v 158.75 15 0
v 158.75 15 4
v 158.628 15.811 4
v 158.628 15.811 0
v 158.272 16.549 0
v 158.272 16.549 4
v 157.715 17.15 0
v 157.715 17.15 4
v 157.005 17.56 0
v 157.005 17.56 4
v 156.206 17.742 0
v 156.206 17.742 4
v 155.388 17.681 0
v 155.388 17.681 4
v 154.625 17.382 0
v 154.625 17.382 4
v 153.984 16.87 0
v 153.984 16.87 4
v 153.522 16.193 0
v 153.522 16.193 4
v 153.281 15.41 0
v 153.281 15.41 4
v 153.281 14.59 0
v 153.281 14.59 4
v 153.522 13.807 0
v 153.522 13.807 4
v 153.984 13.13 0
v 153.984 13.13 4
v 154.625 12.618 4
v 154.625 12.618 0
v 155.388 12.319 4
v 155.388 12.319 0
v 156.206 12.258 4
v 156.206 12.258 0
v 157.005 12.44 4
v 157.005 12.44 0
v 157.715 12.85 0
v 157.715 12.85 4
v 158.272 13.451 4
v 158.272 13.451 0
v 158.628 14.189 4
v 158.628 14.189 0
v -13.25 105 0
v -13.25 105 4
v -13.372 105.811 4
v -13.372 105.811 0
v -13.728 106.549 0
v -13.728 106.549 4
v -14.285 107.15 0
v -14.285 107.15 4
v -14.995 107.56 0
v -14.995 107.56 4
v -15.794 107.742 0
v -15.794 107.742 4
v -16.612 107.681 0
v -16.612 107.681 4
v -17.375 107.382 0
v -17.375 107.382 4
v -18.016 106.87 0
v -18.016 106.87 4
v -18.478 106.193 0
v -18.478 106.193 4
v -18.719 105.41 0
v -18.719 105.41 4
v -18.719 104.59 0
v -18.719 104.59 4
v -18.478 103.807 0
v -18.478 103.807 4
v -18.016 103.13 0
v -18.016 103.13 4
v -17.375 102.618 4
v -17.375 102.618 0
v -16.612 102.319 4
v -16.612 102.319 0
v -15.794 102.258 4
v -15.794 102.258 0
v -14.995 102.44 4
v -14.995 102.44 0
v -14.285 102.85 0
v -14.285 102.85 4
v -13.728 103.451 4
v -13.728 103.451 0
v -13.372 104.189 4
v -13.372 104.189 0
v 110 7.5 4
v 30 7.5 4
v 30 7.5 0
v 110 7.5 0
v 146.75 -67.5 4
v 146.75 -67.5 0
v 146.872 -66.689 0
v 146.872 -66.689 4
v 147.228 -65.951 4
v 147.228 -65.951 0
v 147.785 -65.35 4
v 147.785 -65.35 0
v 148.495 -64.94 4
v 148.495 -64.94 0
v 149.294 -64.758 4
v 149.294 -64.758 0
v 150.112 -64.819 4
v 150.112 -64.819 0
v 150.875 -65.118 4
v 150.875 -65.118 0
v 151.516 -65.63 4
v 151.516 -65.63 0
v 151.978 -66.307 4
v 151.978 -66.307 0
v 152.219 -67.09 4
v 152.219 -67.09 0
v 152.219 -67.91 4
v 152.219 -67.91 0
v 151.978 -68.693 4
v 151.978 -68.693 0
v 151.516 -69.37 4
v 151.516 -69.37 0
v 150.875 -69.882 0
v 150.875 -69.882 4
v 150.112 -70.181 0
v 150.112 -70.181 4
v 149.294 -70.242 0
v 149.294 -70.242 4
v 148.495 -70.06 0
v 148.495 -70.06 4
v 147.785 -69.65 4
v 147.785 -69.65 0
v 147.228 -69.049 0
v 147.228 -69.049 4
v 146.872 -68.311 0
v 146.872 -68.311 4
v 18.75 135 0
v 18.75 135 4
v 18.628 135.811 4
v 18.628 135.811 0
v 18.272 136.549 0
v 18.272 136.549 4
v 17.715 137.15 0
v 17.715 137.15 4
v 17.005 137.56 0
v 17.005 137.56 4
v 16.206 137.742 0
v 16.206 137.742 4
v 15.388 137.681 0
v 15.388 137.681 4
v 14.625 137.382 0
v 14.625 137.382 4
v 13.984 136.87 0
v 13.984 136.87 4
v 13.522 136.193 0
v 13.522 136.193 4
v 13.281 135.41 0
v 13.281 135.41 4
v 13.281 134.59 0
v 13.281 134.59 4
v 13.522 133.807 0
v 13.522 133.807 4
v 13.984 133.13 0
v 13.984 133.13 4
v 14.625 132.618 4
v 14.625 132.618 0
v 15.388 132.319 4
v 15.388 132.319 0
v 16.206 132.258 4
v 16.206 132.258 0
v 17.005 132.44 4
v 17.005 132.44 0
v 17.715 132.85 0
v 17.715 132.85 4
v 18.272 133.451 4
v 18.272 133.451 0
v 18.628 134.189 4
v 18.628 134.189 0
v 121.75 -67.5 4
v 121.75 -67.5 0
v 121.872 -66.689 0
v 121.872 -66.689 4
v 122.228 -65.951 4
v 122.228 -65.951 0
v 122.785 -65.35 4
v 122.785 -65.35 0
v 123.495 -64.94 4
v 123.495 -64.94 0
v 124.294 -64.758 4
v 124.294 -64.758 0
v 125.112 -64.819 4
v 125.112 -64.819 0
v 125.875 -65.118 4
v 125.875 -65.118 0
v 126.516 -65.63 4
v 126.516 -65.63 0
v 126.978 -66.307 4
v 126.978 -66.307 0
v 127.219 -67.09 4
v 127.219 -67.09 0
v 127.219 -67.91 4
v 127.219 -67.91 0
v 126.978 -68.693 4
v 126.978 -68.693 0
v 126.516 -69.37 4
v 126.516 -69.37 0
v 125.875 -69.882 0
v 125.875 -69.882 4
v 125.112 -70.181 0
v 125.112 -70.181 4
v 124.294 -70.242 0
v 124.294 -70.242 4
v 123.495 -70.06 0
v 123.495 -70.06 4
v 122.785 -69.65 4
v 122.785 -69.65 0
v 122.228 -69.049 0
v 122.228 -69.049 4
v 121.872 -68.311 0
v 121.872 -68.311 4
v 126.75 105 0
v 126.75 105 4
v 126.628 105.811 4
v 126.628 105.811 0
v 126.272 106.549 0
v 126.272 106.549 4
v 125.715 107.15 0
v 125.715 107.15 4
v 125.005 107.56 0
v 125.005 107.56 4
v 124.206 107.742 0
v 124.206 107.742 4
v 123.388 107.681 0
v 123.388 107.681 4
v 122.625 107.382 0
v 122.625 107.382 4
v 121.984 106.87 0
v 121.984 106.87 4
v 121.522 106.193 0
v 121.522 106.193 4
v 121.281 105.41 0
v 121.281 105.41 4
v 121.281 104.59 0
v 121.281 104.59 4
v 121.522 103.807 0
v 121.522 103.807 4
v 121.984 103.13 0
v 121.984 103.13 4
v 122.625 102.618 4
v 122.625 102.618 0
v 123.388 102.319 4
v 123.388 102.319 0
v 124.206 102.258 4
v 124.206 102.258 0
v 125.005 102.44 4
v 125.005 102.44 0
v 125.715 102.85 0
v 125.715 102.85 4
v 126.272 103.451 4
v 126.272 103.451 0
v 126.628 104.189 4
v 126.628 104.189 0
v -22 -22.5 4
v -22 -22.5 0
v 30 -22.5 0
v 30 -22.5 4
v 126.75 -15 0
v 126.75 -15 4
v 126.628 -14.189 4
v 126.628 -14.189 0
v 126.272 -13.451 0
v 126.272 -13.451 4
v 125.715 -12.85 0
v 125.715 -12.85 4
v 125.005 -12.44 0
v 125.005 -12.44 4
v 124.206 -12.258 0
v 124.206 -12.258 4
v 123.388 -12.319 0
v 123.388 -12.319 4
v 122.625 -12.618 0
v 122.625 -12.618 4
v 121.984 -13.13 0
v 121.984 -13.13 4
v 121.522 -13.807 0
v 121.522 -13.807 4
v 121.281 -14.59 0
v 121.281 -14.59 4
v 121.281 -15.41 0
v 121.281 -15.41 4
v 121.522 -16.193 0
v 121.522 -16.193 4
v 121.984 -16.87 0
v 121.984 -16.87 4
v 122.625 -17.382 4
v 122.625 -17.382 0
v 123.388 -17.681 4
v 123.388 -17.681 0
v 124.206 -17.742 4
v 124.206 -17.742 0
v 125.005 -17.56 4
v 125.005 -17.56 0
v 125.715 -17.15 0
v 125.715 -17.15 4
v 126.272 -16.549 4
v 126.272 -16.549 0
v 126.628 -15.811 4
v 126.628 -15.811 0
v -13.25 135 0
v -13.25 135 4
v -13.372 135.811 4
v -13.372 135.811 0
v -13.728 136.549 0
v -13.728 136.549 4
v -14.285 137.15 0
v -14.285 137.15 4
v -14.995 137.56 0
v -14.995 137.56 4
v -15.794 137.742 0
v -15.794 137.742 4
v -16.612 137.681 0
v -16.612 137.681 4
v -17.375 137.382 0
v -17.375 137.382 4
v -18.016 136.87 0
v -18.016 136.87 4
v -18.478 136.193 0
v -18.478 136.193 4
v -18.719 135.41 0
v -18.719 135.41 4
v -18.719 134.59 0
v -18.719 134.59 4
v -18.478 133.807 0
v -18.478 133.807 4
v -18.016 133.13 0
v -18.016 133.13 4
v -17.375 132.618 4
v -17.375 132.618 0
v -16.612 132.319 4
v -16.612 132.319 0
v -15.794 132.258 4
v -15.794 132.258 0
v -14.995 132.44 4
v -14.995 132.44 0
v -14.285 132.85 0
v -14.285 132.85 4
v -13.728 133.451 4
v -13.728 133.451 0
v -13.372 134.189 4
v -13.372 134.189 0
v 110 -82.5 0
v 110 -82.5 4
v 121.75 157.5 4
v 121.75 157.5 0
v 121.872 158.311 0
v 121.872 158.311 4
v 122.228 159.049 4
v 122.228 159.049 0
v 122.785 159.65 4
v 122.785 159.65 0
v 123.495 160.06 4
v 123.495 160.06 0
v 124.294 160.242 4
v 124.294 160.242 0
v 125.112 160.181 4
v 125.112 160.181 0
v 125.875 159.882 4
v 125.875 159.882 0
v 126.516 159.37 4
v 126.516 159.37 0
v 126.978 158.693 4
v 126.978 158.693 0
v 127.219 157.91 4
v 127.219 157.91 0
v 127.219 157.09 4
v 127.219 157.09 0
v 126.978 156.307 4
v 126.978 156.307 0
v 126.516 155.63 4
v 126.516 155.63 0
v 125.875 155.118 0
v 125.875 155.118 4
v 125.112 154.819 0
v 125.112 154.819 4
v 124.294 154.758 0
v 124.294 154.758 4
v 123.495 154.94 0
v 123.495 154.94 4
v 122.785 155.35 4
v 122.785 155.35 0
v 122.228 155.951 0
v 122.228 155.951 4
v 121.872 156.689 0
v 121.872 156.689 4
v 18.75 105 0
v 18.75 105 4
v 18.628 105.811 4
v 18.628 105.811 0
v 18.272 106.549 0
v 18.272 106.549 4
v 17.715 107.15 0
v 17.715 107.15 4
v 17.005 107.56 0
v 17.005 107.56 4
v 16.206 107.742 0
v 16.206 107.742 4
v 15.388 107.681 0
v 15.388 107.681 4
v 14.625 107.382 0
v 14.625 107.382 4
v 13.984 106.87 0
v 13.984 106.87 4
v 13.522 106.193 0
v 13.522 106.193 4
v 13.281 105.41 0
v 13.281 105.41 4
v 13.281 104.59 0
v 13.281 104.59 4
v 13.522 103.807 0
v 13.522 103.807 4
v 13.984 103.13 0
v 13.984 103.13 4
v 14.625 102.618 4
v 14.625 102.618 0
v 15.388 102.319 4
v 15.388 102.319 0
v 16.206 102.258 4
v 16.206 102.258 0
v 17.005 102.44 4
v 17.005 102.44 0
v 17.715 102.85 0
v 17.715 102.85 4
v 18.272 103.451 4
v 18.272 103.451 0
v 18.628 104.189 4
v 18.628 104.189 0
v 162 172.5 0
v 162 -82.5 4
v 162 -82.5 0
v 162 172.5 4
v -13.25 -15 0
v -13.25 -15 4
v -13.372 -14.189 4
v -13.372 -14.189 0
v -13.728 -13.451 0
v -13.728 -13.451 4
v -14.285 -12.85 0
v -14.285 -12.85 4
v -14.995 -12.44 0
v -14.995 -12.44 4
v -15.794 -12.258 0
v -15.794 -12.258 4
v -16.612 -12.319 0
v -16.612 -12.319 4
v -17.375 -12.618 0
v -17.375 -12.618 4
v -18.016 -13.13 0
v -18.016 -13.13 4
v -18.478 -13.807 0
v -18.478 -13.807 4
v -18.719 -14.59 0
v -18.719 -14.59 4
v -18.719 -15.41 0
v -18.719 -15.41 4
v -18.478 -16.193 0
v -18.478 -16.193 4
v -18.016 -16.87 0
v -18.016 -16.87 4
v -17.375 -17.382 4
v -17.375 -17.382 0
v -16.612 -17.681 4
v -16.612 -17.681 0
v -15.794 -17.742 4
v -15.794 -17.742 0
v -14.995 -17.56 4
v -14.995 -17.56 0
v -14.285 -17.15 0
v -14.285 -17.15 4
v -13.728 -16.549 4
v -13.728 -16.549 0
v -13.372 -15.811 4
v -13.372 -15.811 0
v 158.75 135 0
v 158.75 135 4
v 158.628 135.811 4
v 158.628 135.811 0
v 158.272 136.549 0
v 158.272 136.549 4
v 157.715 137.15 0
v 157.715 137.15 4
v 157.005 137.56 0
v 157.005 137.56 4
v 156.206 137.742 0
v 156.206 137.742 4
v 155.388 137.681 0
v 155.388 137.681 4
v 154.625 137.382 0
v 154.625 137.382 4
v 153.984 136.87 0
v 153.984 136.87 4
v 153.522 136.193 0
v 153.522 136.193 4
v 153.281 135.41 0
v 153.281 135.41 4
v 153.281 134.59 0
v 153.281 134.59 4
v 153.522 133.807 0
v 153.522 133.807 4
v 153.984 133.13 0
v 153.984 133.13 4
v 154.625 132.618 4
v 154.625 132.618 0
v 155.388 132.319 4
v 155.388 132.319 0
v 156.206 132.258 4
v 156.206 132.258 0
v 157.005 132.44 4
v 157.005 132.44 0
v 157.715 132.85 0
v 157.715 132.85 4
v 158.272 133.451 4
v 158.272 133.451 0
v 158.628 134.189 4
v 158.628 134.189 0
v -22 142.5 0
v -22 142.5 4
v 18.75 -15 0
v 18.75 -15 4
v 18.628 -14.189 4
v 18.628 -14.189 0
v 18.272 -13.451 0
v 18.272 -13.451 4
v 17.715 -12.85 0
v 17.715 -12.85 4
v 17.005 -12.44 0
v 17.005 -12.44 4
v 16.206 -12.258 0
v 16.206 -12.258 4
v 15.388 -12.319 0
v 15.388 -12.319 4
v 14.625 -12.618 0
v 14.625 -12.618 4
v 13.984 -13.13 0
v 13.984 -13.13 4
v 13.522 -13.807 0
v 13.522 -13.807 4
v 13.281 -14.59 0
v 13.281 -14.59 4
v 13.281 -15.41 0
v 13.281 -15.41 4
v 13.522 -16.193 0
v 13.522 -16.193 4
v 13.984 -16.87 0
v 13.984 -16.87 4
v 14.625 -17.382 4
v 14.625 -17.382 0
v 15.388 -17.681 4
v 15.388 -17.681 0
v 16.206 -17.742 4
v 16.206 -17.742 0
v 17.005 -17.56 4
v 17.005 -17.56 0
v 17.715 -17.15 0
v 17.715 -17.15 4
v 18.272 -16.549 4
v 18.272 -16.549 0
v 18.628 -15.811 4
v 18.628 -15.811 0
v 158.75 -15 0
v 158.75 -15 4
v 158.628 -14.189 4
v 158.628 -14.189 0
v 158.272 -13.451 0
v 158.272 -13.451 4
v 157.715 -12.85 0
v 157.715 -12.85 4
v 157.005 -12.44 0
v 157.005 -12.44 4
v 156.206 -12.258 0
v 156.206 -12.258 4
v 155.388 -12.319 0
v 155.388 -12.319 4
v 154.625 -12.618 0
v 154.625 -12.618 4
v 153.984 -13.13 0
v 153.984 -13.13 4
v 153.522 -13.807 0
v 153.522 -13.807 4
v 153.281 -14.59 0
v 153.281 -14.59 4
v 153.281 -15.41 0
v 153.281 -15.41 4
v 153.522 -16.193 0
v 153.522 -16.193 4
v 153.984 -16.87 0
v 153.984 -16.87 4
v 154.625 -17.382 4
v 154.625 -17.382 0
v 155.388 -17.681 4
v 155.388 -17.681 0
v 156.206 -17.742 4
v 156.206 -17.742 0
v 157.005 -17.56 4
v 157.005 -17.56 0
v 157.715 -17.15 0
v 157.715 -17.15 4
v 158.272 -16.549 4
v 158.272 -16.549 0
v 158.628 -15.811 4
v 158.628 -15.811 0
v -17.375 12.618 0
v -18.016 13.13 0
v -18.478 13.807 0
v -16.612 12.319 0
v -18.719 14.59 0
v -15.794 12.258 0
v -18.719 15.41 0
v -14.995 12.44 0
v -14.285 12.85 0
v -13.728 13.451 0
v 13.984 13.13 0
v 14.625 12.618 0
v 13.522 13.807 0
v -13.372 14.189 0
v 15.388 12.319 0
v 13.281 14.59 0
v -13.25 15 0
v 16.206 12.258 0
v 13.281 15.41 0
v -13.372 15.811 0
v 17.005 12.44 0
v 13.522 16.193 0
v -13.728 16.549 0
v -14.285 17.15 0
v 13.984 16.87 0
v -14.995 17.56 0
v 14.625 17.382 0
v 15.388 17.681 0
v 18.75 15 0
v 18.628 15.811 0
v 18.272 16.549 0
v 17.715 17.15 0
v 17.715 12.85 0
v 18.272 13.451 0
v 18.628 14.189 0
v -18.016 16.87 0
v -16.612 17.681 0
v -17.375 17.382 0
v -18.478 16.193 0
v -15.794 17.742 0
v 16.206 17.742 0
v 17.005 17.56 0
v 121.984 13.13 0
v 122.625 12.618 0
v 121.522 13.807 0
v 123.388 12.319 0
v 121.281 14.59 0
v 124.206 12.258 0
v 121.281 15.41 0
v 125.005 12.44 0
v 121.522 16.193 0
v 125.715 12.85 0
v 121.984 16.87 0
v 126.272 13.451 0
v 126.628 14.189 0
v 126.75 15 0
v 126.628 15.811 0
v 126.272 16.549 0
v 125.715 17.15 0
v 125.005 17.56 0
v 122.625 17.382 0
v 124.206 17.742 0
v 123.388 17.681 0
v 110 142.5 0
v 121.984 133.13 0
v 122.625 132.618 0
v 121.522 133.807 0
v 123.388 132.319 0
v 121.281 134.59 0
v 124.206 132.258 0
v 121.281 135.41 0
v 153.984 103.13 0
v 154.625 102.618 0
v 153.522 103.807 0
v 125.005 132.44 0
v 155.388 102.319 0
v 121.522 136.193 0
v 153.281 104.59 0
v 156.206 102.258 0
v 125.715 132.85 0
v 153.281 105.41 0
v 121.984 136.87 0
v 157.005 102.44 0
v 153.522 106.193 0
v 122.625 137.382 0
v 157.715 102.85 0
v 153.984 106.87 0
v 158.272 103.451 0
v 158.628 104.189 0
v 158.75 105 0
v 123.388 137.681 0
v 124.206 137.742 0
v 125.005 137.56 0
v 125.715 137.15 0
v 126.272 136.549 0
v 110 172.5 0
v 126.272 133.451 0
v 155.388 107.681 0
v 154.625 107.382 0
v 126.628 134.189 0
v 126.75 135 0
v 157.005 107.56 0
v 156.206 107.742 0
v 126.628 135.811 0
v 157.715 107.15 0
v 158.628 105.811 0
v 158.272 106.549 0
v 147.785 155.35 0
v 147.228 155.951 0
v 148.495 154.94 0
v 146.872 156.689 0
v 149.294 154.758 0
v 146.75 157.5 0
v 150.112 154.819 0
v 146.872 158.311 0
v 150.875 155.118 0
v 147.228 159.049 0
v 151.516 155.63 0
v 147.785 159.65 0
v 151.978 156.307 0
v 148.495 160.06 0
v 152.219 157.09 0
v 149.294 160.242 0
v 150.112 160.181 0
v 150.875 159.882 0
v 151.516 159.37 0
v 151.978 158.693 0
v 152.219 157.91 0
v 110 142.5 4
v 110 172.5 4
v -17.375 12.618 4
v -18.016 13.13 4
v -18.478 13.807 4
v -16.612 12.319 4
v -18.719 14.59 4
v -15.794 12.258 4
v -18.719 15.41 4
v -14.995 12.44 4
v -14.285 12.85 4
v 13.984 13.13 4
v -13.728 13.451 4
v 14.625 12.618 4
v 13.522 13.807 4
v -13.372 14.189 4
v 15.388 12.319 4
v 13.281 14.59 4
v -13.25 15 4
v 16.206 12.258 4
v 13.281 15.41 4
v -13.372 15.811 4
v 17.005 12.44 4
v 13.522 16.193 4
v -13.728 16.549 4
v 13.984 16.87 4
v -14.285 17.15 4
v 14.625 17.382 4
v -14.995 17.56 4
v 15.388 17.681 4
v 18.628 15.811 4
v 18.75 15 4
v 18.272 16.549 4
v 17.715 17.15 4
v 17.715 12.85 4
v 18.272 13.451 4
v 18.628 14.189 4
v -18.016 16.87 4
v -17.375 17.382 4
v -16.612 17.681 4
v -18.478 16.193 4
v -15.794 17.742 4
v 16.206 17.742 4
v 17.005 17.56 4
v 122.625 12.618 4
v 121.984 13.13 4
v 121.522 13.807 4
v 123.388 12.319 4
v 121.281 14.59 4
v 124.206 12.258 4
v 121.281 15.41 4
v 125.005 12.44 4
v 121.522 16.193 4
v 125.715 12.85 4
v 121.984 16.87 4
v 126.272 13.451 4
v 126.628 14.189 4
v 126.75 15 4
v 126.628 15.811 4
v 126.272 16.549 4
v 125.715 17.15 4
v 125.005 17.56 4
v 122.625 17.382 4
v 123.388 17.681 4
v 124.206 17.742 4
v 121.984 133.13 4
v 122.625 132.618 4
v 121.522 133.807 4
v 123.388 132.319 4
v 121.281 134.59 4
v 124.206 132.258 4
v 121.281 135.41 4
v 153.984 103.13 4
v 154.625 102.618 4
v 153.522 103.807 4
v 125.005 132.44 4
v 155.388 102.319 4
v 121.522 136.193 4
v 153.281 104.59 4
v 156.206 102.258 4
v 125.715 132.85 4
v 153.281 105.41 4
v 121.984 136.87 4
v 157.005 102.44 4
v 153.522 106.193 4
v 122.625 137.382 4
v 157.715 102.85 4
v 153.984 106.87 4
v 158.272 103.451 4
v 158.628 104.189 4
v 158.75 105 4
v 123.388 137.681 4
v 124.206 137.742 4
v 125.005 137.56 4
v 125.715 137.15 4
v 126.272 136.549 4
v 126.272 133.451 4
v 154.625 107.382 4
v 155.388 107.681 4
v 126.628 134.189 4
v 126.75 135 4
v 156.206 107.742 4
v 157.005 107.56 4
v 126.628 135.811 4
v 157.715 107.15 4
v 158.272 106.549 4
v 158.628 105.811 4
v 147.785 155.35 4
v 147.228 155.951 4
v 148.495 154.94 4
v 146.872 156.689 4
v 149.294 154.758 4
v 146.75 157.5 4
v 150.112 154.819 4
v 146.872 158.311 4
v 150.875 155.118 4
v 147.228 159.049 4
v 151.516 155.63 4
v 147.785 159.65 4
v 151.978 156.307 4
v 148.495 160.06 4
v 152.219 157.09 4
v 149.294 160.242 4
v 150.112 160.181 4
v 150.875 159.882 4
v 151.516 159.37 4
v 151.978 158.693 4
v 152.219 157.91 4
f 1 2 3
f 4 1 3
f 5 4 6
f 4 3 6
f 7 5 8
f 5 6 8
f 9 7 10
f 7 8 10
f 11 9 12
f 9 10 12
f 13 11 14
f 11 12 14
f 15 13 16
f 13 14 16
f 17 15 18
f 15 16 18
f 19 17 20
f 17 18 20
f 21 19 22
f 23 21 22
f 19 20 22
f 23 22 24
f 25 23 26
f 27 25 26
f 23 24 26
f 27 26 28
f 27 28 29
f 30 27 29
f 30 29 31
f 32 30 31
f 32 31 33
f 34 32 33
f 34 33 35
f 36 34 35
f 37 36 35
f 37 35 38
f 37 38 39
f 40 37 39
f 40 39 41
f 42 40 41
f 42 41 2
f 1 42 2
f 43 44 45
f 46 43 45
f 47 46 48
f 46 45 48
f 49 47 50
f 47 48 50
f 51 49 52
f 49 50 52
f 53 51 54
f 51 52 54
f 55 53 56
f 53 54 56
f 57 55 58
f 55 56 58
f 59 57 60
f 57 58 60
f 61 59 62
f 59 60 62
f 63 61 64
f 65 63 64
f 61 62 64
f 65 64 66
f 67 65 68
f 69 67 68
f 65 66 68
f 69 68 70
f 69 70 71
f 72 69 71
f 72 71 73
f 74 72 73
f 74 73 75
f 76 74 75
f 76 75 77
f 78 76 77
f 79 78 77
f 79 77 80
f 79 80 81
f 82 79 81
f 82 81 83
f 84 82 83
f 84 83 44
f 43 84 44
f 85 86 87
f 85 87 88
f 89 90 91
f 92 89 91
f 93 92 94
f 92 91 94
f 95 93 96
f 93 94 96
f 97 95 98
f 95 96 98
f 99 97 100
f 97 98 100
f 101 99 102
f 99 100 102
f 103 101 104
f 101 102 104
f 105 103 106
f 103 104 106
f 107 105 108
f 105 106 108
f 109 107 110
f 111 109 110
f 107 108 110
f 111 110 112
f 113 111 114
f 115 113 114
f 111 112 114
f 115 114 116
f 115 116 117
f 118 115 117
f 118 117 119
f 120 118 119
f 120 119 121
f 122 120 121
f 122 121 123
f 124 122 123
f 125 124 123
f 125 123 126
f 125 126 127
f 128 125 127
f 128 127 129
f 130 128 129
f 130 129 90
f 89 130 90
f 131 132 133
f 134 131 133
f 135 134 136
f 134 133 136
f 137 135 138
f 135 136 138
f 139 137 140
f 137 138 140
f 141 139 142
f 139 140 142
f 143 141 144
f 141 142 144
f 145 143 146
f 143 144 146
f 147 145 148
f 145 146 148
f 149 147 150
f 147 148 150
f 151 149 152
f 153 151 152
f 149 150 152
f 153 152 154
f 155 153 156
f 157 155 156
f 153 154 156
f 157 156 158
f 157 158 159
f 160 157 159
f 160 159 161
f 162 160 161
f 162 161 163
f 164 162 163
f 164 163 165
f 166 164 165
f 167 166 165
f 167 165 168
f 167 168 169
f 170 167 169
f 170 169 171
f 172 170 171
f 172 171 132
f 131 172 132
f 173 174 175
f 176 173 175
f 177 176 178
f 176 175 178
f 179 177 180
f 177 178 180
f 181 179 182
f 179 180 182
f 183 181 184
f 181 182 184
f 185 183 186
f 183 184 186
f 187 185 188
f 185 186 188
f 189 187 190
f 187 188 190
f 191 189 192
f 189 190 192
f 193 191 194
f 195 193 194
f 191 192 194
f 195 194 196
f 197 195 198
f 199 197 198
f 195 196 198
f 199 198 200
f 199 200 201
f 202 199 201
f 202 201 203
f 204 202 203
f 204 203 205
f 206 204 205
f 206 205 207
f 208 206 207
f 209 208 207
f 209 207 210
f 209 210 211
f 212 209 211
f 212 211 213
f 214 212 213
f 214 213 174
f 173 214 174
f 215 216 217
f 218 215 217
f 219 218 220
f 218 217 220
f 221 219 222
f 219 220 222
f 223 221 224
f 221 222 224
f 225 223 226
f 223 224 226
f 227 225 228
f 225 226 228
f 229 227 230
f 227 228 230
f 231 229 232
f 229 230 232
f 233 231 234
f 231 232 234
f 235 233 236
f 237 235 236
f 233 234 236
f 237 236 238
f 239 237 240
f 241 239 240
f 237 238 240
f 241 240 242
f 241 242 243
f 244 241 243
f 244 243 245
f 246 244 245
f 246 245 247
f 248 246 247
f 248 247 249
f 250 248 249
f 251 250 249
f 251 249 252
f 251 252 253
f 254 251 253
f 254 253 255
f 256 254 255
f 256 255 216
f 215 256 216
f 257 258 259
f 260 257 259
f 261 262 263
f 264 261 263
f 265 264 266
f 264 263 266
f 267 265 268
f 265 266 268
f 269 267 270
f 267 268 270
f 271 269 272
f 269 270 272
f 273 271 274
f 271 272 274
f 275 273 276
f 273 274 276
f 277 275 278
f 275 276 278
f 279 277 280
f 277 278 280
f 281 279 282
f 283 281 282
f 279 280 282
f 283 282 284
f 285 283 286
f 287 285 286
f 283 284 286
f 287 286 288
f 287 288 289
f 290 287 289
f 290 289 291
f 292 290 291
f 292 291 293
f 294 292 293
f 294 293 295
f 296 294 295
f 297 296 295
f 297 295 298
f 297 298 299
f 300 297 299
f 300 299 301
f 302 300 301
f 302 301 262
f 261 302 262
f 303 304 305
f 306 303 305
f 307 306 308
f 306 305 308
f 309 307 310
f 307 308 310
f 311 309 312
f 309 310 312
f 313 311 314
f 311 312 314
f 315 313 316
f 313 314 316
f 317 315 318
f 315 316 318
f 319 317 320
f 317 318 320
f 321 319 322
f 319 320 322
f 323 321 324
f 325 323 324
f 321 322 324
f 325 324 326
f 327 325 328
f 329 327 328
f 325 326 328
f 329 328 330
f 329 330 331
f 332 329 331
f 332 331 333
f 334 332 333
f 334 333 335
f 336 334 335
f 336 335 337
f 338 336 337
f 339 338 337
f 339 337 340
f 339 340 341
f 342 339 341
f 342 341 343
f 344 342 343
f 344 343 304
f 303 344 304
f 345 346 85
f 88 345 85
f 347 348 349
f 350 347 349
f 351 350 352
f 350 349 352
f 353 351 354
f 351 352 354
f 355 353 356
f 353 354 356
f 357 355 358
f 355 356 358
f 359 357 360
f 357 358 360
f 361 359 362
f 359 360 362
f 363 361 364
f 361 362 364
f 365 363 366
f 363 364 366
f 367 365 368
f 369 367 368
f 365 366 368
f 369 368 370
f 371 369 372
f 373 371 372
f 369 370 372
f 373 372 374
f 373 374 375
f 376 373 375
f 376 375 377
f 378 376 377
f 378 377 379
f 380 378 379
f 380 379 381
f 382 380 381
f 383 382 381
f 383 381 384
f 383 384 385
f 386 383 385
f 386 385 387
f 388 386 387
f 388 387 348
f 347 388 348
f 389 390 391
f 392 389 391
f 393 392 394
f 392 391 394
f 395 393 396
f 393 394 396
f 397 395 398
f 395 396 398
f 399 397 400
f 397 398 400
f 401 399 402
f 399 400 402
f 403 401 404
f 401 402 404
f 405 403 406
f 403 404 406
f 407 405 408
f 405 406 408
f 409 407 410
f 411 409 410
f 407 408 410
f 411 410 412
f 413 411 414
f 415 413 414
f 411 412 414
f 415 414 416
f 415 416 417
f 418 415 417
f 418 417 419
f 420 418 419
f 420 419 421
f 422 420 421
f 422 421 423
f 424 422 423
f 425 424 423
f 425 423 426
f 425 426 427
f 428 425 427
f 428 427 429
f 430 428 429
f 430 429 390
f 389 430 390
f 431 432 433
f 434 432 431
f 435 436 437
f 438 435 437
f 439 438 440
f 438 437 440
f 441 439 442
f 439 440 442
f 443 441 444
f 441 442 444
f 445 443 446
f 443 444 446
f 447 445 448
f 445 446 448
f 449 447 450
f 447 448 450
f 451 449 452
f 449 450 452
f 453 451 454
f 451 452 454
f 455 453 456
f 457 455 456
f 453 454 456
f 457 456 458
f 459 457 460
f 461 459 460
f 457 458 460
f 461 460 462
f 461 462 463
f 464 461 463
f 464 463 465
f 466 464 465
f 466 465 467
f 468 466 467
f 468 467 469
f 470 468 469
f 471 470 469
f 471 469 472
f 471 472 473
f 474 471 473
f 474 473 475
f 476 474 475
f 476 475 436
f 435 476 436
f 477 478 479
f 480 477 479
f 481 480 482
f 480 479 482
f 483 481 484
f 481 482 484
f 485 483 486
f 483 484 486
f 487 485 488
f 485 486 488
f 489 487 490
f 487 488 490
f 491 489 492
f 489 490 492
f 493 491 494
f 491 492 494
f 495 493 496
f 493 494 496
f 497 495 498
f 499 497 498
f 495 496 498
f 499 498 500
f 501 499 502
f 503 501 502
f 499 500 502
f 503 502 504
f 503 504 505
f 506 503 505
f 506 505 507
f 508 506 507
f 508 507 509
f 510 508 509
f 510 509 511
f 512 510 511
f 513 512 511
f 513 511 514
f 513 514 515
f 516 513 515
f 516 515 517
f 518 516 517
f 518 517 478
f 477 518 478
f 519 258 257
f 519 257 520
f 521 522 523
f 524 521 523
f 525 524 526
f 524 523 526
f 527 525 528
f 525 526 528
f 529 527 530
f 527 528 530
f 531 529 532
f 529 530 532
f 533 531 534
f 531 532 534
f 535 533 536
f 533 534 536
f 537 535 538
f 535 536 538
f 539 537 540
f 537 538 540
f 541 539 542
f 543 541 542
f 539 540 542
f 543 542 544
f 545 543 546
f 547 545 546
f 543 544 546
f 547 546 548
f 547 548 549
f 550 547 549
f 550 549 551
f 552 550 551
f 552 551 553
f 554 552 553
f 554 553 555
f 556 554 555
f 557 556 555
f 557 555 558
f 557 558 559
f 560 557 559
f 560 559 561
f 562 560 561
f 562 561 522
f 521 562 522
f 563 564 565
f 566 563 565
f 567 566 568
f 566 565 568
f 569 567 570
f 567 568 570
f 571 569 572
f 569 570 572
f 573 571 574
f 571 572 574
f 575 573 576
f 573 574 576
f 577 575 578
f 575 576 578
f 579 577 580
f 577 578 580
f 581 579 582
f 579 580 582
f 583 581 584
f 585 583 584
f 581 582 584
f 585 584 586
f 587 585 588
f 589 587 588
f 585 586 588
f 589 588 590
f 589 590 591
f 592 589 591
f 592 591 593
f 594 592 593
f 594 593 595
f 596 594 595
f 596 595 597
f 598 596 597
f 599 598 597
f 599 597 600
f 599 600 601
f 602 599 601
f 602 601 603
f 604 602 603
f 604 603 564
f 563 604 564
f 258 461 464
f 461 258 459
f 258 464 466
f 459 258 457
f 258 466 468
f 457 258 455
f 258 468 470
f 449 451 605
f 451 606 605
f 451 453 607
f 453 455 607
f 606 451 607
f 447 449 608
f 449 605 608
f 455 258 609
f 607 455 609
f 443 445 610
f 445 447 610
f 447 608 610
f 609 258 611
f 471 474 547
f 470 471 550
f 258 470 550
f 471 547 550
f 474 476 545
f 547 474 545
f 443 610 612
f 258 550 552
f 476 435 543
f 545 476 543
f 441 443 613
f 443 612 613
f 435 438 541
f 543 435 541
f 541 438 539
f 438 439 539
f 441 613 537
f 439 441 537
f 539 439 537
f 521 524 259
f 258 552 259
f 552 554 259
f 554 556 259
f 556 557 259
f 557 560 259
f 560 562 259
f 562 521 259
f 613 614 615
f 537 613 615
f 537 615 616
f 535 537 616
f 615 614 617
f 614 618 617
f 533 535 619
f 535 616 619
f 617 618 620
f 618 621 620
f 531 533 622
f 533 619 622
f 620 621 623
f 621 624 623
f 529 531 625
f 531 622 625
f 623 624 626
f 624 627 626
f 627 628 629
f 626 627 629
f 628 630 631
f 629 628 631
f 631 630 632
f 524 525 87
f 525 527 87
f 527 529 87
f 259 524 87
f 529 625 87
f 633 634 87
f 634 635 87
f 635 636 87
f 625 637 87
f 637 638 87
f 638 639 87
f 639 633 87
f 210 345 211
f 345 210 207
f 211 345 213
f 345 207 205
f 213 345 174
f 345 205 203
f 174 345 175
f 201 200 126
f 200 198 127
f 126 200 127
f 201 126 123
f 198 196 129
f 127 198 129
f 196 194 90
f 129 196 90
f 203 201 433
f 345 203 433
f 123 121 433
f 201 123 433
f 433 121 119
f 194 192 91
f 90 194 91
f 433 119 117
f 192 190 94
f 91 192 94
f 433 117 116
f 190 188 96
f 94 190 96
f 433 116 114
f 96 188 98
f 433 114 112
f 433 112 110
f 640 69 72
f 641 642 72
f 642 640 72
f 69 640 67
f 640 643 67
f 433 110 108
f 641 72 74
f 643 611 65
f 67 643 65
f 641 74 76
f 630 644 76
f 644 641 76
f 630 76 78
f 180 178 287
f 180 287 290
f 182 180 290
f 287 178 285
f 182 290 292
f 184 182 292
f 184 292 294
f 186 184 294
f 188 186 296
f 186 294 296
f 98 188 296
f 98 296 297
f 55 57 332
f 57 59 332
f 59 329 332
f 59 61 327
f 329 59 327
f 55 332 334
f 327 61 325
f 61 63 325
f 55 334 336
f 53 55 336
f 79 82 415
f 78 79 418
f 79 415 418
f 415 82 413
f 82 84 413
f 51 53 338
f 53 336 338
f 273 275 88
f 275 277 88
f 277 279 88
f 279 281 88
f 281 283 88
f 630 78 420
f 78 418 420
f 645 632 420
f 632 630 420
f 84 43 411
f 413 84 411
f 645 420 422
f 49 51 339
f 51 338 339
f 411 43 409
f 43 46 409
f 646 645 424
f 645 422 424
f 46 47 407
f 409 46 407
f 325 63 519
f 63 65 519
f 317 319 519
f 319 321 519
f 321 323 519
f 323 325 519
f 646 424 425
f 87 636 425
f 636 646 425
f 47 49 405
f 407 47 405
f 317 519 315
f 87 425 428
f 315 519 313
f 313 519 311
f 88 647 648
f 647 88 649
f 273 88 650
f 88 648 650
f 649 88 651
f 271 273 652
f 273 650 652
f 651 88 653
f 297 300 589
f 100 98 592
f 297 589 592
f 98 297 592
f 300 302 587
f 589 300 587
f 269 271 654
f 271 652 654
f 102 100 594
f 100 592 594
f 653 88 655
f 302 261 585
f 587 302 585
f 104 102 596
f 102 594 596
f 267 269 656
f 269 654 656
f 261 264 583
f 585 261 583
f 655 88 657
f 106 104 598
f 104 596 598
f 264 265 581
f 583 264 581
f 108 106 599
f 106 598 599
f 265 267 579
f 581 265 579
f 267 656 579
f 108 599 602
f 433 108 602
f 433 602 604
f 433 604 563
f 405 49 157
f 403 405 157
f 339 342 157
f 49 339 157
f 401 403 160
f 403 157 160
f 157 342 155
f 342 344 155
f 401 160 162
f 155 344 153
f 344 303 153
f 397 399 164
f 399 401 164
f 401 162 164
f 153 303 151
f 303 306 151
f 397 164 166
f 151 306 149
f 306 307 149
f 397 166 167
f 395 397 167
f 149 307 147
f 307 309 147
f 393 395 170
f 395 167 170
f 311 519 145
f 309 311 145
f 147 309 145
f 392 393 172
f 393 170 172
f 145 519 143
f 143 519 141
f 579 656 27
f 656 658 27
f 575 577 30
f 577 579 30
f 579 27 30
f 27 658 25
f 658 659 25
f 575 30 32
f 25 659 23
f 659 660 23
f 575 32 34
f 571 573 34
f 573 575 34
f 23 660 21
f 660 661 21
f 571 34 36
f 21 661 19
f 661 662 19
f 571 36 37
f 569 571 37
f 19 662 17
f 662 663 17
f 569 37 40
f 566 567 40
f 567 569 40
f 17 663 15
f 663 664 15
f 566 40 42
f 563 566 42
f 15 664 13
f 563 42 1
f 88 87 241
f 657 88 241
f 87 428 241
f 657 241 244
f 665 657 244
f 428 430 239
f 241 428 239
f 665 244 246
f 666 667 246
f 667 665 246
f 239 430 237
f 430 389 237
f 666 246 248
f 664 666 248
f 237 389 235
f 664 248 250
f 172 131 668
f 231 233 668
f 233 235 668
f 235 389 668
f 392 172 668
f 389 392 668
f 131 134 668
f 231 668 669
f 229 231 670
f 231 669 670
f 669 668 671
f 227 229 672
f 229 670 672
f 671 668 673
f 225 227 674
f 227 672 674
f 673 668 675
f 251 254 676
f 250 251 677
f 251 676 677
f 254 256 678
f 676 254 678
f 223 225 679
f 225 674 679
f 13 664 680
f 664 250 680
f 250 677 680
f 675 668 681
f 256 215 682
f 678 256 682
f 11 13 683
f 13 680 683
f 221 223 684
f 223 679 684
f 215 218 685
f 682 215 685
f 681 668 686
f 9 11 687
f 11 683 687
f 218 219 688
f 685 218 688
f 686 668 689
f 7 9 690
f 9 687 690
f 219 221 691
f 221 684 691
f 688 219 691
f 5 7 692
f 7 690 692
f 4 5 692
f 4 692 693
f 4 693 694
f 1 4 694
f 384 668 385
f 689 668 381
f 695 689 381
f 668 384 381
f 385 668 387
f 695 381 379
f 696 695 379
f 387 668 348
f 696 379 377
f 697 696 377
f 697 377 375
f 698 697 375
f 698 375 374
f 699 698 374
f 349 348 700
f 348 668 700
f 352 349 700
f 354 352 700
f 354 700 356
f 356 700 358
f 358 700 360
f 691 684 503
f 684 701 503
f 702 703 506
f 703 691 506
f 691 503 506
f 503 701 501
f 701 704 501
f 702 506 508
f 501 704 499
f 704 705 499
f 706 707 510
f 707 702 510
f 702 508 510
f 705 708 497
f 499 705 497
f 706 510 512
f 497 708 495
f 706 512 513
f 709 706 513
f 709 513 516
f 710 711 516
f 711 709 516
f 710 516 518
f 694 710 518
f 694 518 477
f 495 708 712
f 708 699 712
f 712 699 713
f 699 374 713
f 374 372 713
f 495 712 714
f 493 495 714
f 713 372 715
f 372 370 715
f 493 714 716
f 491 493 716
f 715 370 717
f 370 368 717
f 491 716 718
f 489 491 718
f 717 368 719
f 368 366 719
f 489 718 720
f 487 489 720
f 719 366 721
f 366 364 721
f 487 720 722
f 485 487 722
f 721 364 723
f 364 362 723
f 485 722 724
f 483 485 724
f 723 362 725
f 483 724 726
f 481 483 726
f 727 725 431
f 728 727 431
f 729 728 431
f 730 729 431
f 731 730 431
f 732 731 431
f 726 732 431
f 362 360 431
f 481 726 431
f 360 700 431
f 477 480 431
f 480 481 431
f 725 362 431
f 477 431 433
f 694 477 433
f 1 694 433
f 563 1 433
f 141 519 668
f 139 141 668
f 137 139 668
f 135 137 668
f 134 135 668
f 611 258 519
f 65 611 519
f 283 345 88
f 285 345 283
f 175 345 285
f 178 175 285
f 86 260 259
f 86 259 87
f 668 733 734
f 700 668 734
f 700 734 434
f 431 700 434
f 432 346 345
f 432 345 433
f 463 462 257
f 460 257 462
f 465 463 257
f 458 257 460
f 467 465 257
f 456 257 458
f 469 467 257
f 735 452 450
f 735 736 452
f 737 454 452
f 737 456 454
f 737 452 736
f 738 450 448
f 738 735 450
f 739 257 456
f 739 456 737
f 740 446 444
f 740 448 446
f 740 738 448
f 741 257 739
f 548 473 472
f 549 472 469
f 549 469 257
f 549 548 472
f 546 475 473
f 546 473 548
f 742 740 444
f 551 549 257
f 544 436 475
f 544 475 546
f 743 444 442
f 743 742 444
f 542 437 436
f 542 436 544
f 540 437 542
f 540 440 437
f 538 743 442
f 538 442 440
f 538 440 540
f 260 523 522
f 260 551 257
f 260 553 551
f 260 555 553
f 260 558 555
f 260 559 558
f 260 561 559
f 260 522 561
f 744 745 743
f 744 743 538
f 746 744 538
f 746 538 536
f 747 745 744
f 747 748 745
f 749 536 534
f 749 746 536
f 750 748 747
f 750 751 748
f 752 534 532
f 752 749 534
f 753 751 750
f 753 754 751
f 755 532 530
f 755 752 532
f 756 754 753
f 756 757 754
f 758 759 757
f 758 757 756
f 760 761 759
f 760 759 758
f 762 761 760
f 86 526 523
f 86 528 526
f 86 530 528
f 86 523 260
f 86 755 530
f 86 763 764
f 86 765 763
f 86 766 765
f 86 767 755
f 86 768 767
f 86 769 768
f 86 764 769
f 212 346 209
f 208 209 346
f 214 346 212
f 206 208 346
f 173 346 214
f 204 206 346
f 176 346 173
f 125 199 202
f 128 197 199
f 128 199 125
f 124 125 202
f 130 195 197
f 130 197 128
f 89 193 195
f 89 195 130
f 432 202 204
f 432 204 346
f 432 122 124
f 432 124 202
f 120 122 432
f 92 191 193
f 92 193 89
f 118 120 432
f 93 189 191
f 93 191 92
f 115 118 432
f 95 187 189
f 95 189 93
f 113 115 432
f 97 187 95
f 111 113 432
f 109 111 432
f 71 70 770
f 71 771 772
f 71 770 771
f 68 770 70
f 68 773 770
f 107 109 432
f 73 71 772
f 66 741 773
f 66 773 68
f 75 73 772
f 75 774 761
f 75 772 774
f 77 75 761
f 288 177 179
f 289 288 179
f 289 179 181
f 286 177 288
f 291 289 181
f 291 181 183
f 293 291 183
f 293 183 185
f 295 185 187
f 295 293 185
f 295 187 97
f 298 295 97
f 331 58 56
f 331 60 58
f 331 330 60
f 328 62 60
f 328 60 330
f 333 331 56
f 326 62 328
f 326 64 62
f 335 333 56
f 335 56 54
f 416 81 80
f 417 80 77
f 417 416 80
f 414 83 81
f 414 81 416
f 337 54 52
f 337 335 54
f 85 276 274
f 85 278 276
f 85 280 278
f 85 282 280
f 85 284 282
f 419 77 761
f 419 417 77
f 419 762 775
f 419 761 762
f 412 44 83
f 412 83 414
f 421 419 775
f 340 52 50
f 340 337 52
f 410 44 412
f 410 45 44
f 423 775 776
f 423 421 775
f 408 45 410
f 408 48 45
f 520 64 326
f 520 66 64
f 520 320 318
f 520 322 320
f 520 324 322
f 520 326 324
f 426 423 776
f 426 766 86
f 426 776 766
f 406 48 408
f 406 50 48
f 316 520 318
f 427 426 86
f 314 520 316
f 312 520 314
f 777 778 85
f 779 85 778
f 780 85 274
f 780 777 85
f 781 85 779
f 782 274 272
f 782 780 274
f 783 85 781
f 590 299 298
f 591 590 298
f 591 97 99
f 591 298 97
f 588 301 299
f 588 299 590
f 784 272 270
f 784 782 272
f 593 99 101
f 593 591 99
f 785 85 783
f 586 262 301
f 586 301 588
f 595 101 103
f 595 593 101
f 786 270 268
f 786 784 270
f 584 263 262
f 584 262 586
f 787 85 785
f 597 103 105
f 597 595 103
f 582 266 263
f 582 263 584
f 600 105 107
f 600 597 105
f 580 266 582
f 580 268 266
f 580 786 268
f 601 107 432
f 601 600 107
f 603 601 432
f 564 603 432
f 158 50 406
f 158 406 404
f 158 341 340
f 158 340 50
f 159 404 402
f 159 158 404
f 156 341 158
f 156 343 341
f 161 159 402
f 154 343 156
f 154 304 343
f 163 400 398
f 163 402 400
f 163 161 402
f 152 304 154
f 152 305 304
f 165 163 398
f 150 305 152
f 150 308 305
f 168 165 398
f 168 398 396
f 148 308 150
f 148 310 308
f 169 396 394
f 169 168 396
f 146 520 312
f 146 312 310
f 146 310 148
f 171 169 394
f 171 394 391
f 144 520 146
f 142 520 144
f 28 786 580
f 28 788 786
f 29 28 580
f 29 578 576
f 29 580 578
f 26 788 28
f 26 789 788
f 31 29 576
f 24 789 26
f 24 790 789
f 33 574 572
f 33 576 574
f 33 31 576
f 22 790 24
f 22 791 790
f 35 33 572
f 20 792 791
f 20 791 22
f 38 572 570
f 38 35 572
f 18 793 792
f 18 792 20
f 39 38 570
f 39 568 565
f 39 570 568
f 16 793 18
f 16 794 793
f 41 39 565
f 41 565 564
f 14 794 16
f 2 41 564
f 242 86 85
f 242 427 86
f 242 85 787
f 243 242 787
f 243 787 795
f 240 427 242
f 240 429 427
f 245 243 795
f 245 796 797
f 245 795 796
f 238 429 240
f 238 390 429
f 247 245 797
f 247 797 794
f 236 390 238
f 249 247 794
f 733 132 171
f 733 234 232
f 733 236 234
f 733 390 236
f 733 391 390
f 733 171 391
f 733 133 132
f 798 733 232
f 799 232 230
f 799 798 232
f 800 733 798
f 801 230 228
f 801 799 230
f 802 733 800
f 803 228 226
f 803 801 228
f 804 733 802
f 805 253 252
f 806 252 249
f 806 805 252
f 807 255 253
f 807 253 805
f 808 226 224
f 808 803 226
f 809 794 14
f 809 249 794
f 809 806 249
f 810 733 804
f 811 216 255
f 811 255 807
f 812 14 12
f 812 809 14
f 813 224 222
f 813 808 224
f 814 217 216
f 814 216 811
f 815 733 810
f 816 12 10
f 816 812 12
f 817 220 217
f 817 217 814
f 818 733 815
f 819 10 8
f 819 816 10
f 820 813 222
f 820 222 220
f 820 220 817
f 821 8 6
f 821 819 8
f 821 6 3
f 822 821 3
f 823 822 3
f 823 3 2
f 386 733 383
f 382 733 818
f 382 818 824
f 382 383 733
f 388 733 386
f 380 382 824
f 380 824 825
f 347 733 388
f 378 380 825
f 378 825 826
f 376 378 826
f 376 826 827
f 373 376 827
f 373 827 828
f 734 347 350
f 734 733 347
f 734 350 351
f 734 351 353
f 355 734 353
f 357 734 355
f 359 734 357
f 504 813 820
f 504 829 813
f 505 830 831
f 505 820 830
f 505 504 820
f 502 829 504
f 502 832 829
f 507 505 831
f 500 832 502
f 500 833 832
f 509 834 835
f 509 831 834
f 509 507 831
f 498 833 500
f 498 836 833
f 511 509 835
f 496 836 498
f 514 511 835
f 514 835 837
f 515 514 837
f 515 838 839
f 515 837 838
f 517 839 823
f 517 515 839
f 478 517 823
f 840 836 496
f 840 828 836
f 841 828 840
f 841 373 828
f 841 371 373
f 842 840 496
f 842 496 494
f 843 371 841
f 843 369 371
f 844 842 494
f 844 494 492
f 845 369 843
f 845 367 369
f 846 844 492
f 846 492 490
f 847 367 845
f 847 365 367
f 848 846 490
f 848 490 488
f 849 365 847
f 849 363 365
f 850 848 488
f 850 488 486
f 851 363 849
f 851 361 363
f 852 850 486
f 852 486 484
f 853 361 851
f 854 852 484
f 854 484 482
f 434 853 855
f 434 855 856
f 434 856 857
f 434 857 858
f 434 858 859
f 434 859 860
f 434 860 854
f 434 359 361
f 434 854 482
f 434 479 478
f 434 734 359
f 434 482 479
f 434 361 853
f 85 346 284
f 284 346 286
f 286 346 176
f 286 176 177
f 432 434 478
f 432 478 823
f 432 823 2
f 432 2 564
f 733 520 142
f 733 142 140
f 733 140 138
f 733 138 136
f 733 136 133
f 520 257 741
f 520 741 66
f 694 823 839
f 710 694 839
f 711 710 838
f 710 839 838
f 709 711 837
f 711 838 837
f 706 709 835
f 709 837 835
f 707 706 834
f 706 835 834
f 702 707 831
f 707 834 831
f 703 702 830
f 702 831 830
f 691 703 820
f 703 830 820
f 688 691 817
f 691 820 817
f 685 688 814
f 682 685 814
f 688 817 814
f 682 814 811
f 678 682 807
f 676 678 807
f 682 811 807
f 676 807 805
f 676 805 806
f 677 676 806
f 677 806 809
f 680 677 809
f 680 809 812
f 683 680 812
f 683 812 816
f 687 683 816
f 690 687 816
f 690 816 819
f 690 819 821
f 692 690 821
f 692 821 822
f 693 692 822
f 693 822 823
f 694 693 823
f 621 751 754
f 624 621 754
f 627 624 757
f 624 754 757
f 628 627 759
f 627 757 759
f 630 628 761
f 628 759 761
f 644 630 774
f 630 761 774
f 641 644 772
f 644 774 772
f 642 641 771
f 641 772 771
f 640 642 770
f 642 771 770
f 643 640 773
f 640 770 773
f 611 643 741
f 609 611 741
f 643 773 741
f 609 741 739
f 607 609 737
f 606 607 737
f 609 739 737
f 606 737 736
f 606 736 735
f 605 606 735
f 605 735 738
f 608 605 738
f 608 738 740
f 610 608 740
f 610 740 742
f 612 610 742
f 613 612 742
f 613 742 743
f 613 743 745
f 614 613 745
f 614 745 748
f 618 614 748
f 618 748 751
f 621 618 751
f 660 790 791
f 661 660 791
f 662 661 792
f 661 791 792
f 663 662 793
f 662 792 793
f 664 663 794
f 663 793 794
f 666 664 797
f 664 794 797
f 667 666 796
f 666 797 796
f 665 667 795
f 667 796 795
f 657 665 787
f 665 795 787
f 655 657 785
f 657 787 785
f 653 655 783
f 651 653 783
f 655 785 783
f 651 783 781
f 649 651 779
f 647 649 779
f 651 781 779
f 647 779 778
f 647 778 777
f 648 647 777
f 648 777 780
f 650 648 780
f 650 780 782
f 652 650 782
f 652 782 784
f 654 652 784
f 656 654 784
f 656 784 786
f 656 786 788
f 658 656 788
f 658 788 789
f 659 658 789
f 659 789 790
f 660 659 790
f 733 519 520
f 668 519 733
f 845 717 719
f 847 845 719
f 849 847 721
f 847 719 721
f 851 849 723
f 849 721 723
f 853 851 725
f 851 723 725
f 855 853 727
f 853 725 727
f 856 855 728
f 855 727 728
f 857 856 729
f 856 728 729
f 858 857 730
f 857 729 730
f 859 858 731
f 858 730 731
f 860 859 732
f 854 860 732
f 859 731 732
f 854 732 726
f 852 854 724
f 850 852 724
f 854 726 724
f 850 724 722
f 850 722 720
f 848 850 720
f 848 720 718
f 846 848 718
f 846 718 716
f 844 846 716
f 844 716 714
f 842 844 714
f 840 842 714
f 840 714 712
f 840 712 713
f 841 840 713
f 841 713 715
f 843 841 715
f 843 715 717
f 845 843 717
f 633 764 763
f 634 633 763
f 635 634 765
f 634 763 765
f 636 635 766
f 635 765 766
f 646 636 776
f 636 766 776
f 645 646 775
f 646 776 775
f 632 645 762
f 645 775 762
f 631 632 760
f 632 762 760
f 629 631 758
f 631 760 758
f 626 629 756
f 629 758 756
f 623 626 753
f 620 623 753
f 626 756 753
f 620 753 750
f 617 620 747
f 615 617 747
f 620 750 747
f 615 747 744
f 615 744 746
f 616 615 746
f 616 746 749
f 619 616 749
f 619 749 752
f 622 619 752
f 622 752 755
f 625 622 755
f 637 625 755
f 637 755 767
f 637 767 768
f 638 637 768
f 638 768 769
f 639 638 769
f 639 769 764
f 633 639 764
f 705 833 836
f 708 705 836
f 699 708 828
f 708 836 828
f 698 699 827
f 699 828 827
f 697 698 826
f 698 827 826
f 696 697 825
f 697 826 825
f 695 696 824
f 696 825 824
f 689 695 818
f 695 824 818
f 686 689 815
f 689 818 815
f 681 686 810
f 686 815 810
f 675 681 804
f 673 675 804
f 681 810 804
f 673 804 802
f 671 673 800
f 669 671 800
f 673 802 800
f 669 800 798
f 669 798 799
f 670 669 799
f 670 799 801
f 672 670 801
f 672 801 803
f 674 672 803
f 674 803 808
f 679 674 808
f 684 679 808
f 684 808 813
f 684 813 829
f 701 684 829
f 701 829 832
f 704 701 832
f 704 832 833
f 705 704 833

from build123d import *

# Parameters (mm, degrees)
SKETCH1_W            = 184
SKETCH1_H            = 165
BOSS_EXTRUDE1_DEPTH  = 4
M5_CLEARANCE_HOLE1_D = 5.5
SKETCH4_W            = 80
SKETCH4_H            = 30
CUT_EXTRUDE1_DEPTH   = 10
SKETCH5_W            = 52
SKETCH5_H            = 60
SKETCH5_H_2          = 30
BOSS_EXTRUDE2_DEPTH  = 4
M5_CLEARANCE_HOLE2_D = 5.5


with BuildPart() as part:
    # Sketch1 → Boss-Extrude1 (new body)
    with BuildSketch(Plane.XY):
        with Locations((70, 60)):
            Rectangle(SKETCH1_W, SKETCH1_H)
    extrude(amount=BOSS_EXTRUDE1_DEPTH)

    # M5 Clearance Hole1 (through all)
    with Locations(Plane(origin=(0, 0, 0), x_dir=(-1, 0, 0), z_dir=(0, 0, -1))):
        with Locations((-16, -15), (-16, 15), (16, 15), (16, -15), (16, 105), (-16, 105), (-16, 135), (16, 135), (-124, 135), (-124, 105), (-156, 105), (-156, 135), (-156, 15), (-124, 15), (-124, -15), (-156, -15)):
            Hole(M5_CLEARANCE_HOLE1_D / 2)

    # Sketch4 → Cut-Extrude1 (cut)
    with BuildSketch(Plane.XY.offset(4)):
        with Locations((70, -7.5)):
            Rectangle(SKETCH4_W, SKETCH4_H)
    extrude(amount=-CUT_EXTRUDE1_DEPTH, mode=Mode.SUBTRACT)

    # Sketch5 → Boss-Extrude2 (add)
    with BuildSketch(Plane.XY.offset(4)):
        with Locations((136, -52.5)):
            Rectangle(SKETCH5_W, SKETCH5_H)
        with Locations((136, 157.5)):
            Rectangle(SKETCH5_W, SKETCH5_H_2)
    extrude(amount=-BOSS_EXTRUDE2_DEPTH)

    # M5 Clearance Hole2 (through all)
    with Locations(Plane.XY.offset(4)):
        with Locations((149.5, -67.5), (124.5, -67.5), (124.5, 157.5), (149.5, 157.5)):
            Hole(M5_CLEARANCE_HOLE2_D / 2)


solid = part.part
